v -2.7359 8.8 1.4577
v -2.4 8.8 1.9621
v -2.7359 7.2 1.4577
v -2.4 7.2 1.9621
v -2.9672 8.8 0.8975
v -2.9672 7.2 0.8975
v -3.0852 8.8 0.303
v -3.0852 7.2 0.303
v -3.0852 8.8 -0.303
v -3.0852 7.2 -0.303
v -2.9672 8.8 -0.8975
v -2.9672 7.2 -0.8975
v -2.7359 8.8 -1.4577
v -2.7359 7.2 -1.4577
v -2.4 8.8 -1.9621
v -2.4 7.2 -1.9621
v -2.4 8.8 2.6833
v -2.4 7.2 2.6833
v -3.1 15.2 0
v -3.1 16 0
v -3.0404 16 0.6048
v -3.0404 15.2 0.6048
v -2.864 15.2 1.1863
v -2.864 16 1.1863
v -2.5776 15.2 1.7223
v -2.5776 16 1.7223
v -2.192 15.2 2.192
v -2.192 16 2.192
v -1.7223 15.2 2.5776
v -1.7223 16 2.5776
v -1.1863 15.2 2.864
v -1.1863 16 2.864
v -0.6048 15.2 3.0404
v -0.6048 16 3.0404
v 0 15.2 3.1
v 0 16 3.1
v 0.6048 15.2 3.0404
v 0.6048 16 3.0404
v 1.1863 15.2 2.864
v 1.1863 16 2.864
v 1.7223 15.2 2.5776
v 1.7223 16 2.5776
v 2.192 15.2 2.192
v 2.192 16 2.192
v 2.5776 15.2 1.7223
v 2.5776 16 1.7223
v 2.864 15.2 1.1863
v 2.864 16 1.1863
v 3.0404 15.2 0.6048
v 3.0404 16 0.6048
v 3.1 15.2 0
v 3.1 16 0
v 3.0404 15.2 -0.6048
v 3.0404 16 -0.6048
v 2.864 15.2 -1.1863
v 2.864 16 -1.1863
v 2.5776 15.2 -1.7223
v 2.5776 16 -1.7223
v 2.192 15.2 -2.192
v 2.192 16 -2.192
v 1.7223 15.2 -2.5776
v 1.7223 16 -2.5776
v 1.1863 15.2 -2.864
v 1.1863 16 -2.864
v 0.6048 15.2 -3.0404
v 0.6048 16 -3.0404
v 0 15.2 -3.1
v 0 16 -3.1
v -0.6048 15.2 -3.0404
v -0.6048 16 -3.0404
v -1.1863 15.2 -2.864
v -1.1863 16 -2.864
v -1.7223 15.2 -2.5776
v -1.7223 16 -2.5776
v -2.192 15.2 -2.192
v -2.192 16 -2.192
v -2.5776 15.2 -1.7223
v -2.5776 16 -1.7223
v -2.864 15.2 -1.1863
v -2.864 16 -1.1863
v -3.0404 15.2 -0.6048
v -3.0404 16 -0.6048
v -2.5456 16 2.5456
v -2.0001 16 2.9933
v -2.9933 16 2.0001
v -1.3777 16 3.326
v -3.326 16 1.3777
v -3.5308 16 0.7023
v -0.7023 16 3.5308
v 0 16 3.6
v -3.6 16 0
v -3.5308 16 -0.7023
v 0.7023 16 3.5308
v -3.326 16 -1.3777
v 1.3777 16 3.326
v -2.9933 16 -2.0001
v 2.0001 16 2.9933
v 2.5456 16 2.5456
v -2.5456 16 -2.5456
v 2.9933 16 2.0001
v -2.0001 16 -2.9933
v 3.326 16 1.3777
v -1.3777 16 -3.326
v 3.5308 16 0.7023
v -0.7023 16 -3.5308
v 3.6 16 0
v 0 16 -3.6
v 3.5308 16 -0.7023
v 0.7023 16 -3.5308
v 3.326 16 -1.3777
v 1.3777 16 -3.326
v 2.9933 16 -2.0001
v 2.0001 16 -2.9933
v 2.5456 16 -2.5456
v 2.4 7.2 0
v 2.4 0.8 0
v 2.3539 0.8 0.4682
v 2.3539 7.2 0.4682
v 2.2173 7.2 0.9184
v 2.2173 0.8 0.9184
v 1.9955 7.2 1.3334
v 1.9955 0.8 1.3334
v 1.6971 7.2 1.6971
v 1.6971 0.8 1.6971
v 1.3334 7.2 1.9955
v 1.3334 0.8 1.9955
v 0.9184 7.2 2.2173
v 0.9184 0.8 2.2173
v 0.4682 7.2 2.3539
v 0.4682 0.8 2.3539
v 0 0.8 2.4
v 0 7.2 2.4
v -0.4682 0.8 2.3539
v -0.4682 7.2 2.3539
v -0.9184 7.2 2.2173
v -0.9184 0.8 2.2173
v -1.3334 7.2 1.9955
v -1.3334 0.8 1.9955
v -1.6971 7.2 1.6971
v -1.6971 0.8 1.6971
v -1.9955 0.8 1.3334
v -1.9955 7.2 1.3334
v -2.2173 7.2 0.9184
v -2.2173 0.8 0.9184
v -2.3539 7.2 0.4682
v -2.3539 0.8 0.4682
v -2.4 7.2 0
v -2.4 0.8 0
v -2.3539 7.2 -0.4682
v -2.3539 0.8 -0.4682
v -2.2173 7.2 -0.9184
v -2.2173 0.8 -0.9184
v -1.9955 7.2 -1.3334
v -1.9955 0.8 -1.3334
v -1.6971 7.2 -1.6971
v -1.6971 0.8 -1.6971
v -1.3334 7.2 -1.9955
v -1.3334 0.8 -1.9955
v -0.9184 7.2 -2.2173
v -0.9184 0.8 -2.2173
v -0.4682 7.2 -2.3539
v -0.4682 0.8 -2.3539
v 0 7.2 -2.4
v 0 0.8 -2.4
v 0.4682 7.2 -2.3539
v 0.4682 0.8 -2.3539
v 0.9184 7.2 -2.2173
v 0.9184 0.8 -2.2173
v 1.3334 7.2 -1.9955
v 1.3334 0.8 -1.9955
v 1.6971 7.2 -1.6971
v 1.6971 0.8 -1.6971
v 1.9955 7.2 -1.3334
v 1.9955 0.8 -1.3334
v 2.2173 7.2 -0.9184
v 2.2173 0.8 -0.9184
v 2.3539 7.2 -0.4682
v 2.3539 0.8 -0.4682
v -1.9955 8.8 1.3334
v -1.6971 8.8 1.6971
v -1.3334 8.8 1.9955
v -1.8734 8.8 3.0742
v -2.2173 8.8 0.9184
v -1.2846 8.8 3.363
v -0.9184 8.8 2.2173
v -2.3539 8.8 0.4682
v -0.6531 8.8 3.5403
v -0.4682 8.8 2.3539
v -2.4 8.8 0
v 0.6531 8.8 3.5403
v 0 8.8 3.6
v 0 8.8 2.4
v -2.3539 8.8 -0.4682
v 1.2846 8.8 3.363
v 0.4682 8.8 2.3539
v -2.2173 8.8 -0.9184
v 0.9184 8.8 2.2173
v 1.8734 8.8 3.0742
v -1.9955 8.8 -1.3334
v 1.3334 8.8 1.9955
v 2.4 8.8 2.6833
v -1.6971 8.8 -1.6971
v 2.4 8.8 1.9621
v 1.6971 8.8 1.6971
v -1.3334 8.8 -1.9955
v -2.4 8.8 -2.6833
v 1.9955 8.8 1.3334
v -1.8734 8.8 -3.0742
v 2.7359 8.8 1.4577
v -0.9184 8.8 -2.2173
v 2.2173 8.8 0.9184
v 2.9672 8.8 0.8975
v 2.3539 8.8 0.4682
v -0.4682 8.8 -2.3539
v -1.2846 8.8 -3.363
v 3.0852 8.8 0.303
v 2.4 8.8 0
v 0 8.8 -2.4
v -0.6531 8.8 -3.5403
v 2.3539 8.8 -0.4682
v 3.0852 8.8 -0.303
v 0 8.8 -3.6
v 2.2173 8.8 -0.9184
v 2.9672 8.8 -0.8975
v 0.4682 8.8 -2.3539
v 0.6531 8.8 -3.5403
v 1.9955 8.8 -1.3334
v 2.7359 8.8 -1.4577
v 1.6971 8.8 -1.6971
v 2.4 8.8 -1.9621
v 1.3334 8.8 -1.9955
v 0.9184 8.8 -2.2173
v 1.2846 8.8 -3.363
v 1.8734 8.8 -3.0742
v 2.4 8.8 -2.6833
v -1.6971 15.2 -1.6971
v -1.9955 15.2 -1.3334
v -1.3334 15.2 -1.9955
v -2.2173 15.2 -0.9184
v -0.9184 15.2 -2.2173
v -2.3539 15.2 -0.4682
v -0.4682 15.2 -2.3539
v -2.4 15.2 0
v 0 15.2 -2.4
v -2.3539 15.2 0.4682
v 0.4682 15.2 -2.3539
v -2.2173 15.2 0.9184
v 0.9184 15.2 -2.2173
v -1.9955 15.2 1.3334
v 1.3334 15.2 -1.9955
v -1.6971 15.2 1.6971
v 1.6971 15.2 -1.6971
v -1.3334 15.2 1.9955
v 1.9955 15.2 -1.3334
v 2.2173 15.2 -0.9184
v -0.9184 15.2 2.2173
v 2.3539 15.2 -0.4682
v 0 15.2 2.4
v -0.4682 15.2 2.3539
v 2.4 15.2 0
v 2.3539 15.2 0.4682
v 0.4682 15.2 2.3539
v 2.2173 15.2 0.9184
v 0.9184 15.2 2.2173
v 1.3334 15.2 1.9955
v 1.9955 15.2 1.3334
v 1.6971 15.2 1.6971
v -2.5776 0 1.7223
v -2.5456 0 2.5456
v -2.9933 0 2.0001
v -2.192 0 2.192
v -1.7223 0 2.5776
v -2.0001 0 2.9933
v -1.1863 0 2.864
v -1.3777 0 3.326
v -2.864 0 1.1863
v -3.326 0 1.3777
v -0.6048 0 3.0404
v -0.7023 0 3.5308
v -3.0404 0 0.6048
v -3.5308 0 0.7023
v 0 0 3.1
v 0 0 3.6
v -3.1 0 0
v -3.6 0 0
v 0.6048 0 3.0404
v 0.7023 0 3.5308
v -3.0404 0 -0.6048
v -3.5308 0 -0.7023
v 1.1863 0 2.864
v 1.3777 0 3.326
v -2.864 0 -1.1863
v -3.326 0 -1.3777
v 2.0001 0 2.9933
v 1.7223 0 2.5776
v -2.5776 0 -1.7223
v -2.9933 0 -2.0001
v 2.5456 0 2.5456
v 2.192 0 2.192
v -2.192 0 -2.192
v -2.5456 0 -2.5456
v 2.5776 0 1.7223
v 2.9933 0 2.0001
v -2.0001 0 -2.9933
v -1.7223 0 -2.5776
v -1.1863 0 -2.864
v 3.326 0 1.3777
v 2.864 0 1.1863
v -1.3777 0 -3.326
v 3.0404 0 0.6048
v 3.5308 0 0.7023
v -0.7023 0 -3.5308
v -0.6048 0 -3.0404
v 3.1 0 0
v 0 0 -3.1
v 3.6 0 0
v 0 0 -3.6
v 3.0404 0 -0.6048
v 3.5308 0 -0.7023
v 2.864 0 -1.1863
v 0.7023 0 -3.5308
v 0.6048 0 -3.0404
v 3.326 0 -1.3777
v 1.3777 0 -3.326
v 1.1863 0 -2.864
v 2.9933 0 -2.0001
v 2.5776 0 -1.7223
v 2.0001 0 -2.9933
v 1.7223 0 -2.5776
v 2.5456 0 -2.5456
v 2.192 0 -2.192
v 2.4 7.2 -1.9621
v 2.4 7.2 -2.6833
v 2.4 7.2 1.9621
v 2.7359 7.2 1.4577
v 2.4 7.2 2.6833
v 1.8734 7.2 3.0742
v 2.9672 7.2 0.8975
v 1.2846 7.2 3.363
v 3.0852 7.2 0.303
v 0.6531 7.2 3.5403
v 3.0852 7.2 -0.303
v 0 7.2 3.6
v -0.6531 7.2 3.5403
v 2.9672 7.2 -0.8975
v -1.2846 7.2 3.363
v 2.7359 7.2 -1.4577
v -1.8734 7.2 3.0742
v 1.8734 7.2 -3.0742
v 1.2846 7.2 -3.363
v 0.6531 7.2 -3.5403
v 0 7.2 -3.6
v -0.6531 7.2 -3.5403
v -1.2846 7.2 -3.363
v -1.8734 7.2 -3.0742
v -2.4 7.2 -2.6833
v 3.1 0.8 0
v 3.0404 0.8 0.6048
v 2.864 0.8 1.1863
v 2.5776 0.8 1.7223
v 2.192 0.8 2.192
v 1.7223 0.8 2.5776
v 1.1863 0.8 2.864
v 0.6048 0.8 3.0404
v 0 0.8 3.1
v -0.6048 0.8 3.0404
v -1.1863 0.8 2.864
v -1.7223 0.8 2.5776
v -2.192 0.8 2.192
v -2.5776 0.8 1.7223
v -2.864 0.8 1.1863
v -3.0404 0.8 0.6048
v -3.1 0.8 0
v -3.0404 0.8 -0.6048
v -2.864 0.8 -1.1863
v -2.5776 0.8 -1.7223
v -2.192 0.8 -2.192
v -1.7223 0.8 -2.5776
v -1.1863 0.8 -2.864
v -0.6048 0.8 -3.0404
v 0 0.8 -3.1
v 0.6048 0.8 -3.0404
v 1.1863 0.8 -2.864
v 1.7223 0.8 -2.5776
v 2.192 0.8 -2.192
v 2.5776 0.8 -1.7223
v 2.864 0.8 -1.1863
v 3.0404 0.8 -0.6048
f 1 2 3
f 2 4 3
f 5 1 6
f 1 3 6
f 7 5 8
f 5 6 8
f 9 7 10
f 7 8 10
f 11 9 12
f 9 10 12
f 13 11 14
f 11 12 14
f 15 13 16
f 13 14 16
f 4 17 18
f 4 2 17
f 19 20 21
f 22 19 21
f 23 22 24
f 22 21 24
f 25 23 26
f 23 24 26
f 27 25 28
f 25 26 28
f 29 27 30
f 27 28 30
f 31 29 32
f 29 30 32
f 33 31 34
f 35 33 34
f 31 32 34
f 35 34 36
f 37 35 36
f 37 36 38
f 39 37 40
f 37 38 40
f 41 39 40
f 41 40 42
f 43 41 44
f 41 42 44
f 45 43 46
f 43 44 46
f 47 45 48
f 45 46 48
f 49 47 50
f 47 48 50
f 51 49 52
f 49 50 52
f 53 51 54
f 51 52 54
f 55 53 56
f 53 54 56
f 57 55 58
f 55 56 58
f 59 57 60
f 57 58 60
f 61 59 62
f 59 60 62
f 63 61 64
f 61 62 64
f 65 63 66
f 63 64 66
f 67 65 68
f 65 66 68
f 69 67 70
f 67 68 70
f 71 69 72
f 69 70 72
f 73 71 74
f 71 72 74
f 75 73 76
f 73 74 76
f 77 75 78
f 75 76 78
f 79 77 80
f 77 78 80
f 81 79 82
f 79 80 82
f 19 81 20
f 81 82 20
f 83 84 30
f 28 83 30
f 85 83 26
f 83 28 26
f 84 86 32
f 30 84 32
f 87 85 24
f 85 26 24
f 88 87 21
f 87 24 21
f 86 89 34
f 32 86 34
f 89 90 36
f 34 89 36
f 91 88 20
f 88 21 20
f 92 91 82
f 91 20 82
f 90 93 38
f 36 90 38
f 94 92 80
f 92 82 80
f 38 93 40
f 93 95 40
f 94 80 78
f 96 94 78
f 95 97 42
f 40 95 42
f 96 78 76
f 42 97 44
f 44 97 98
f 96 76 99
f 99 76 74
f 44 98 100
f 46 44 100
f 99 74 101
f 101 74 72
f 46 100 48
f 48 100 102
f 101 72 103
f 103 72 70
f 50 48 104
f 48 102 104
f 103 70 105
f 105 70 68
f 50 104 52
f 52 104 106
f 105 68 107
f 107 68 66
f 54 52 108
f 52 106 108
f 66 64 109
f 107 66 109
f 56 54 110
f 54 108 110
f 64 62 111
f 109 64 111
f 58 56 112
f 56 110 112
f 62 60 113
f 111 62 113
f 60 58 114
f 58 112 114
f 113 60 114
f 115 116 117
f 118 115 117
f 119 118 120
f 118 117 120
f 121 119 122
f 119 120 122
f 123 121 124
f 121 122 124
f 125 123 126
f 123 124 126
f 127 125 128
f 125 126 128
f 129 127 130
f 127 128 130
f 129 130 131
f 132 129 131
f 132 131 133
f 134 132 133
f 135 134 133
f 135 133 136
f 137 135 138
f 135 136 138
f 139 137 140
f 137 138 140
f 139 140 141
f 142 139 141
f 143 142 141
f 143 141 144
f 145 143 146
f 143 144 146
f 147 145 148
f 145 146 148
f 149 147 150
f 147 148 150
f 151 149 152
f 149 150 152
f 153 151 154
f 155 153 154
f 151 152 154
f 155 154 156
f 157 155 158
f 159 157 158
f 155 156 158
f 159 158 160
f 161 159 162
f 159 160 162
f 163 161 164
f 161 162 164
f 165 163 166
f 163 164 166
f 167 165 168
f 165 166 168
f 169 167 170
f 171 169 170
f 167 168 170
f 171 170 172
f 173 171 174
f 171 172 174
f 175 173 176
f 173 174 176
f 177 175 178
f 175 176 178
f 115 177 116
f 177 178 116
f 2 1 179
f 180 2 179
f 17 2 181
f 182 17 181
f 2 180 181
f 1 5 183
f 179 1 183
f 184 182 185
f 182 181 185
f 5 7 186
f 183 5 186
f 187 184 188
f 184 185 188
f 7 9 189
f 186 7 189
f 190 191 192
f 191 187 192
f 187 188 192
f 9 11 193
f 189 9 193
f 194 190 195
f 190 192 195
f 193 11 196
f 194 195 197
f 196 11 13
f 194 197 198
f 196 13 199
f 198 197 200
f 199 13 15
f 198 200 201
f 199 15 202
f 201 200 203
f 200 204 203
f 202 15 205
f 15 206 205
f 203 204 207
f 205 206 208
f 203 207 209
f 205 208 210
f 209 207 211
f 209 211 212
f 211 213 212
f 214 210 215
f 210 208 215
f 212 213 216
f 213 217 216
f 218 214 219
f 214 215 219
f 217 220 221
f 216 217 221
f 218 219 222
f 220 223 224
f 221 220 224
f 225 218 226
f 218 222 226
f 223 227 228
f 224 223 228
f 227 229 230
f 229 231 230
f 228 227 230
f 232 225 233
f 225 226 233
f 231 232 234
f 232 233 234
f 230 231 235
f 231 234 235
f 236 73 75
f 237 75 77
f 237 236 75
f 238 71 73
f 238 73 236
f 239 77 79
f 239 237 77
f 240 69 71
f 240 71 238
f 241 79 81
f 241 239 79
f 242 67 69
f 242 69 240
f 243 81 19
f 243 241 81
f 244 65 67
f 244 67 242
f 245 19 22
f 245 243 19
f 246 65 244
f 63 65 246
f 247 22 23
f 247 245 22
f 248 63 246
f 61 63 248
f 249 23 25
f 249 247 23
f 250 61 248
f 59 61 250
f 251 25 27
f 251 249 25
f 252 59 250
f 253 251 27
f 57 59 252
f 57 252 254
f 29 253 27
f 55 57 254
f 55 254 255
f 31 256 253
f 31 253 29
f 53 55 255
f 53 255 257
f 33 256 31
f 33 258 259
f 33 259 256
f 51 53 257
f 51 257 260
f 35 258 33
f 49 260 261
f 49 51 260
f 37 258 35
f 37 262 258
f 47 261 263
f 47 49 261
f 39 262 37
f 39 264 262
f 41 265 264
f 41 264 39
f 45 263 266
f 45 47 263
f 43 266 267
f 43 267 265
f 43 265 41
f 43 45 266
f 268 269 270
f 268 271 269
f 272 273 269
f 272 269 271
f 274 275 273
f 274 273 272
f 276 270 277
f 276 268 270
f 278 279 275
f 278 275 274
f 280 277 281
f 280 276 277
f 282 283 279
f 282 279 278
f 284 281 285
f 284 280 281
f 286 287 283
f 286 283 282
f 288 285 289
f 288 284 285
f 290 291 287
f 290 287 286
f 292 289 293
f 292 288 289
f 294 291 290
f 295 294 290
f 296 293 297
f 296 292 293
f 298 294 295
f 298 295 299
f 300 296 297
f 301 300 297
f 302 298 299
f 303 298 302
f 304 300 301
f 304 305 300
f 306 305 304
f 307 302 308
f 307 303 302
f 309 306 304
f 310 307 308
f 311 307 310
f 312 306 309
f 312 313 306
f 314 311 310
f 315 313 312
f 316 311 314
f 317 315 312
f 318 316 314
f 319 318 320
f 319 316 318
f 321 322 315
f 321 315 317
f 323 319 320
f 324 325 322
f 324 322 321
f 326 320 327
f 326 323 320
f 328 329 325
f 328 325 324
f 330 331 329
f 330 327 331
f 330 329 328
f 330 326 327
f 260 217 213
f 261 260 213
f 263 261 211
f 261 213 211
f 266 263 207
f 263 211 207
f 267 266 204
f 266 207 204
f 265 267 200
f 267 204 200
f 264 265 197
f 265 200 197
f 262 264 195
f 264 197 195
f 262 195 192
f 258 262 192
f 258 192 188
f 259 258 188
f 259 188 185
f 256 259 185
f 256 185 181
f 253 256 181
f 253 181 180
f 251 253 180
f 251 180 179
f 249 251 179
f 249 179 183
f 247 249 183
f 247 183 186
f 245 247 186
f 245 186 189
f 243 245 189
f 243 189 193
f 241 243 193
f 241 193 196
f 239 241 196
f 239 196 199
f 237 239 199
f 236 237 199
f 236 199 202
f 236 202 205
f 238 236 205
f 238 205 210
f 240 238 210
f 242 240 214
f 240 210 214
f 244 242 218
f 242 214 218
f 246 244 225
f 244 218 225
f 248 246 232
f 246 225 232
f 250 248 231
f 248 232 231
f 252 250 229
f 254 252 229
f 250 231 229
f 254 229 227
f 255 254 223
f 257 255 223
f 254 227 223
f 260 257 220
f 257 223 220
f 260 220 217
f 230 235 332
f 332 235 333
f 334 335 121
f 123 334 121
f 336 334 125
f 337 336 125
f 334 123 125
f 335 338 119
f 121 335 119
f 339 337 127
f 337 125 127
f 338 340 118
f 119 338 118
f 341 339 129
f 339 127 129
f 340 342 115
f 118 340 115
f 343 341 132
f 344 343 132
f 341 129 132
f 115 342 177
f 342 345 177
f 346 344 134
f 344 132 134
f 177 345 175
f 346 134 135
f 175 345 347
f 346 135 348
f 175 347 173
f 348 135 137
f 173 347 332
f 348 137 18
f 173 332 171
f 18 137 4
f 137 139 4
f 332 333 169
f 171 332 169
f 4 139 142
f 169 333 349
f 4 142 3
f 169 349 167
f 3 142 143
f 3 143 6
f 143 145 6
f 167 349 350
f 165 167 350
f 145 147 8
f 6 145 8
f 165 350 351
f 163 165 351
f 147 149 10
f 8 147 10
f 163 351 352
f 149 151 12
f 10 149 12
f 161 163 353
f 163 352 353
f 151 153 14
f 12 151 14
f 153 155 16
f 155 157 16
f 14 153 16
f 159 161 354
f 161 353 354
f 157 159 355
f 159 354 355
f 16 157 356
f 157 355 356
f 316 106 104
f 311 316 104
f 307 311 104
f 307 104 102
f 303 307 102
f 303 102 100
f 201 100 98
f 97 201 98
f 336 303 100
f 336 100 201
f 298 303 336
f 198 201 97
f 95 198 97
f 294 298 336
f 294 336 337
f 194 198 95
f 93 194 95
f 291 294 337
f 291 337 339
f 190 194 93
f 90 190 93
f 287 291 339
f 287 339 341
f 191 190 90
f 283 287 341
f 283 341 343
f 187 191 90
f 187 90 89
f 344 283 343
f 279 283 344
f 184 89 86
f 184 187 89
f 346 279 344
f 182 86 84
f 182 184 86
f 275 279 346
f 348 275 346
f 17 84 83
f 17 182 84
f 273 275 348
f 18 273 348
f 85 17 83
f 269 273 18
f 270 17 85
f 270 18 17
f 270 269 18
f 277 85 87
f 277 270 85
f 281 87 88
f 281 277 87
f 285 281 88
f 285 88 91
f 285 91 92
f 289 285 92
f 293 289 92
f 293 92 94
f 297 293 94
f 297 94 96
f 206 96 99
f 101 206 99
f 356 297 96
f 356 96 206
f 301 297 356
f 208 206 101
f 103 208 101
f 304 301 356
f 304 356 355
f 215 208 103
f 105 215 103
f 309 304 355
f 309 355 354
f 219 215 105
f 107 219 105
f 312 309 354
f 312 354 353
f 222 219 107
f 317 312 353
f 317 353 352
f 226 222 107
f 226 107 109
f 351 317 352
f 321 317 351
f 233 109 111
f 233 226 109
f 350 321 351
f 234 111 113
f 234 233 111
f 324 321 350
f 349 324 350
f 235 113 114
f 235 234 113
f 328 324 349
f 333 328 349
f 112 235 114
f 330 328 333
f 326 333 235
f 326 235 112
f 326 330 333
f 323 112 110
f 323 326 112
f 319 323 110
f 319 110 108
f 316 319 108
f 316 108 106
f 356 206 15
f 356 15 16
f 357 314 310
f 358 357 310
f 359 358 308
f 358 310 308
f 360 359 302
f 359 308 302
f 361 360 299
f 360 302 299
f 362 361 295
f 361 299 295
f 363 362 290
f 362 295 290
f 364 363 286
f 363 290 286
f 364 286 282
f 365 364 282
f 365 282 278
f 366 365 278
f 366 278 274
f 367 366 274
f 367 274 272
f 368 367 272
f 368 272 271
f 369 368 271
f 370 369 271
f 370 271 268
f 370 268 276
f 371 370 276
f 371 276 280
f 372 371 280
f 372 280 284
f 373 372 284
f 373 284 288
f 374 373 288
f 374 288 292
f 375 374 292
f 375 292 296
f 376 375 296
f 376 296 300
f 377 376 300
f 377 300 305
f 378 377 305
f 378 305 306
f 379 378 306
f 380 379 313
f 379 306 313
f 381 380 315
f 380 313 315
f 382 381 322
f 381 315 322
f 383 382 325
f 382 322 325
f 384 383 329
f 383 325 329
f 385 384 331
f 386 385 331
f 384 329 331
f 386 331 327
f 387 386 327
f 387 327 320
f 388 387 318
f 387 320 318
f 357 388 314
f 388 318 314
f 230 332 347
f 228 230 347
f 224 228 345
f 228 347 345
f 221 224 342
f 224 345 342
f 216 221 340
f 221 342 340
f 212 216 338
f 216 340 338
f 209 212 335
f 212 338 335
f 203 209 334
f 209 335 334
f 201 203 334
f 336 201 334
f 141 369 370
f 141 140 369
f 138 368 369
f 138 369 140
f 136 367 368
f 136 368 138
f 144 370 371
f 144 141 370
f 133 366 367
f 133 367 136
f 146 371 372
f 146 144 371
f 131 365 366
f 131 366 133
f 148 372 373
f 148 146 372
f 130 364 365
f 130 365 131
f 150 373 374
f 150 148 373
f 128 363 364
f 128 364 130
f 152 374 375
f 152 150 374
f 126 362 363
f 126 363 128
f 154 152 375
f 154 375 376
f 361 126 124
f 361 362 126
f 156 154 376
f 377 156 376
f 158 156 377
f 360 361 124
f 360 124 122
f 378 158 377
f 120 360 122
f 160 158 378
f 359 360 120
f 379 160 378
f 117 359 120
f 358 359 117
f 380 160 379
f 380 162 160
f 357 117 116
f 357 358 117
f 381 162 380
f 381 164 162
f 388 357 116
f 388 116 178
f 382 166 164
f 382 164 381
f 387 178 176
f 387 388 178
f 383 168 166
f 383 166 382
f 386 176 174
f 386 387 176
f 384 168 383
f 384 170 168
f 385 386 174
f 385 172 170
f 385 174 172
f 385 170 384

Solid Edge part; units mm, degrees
sketch "Sketch1" plane through (0, 0, 0) normal (0, -1, 0) x (1, 0, 0)
  circle A0 centre (0, 0) radius 3.6
extrude "Protrusion1" add sketch "Sketch1" against normal blind 16
sketch "Sketch2" plane through (0, 0, 0) normal (0, -1, 0) x (1, 0, 0)
  circle A0 centre (0, 0) radius 3.1
extrude "ExtrudedCutout_1" cut sketch "Sketch2" against normal blind 0.8
sketch "Sketch3" plane through (0, 16, 0) normal (0, 1, 0) x (-1, 0, 0)
  circle A0 centre (0, 0) radius 3.1
extrude "ExtrudedCutout_2" cut sketch "Sketch3" against normal blind 0.8
sketch "Sketch4" plane through (0, 0.8, 0) normal (0, -1, 0) x (1, 0, 0)
  circle A0 centre (0, 0) radius 2.4
extrude "ExtrudedCutout_3" cut sketch "Sketch4" against normal blind 20
sketch "Sketch5" plane through (0, 0, 0) normal (0, 0, 1) x (1, 0, 0)
  line L0 (-2, 8.8) -> (2, 8.8)
  line L1 (2, 8.8) -> (2.4, 8.8)
  line L2 (2.4, 8.8) -> (2.4, 7.2)
  line L3 (2.4, 7.2) -> (2, 7.2)
  line L4 (2, 7.2) -> (-2, 7.2)
  line L5 (-2.4, 7.2) -> (-2, 7.2)
  line L6 (-2.4, 8.8) -> (-2.4, 7.2)
  line L7 (-2, 8.8) -> (-2.4, 8.8)
extrude "ExtrudedCutout_5" cut sketch "Sketch5" along normal mid plane 60
sketch "Sketch6" plane through (0, 0, 0) normal (1, 0, 0) x (0, 1, 0)
  line L0 (8.8, 3.1) -> (8.8, 0)
  line L1 (7.2, 3.1) -> (7.2, 0)
  line L2 (8.8, 3.1) -> (7.2, 3.1)
revolve "RevolvedCutout1" cut sketch "Sketch6" angle 360 about axis through (0, 7.2, 0) along (0, 1, 0)
